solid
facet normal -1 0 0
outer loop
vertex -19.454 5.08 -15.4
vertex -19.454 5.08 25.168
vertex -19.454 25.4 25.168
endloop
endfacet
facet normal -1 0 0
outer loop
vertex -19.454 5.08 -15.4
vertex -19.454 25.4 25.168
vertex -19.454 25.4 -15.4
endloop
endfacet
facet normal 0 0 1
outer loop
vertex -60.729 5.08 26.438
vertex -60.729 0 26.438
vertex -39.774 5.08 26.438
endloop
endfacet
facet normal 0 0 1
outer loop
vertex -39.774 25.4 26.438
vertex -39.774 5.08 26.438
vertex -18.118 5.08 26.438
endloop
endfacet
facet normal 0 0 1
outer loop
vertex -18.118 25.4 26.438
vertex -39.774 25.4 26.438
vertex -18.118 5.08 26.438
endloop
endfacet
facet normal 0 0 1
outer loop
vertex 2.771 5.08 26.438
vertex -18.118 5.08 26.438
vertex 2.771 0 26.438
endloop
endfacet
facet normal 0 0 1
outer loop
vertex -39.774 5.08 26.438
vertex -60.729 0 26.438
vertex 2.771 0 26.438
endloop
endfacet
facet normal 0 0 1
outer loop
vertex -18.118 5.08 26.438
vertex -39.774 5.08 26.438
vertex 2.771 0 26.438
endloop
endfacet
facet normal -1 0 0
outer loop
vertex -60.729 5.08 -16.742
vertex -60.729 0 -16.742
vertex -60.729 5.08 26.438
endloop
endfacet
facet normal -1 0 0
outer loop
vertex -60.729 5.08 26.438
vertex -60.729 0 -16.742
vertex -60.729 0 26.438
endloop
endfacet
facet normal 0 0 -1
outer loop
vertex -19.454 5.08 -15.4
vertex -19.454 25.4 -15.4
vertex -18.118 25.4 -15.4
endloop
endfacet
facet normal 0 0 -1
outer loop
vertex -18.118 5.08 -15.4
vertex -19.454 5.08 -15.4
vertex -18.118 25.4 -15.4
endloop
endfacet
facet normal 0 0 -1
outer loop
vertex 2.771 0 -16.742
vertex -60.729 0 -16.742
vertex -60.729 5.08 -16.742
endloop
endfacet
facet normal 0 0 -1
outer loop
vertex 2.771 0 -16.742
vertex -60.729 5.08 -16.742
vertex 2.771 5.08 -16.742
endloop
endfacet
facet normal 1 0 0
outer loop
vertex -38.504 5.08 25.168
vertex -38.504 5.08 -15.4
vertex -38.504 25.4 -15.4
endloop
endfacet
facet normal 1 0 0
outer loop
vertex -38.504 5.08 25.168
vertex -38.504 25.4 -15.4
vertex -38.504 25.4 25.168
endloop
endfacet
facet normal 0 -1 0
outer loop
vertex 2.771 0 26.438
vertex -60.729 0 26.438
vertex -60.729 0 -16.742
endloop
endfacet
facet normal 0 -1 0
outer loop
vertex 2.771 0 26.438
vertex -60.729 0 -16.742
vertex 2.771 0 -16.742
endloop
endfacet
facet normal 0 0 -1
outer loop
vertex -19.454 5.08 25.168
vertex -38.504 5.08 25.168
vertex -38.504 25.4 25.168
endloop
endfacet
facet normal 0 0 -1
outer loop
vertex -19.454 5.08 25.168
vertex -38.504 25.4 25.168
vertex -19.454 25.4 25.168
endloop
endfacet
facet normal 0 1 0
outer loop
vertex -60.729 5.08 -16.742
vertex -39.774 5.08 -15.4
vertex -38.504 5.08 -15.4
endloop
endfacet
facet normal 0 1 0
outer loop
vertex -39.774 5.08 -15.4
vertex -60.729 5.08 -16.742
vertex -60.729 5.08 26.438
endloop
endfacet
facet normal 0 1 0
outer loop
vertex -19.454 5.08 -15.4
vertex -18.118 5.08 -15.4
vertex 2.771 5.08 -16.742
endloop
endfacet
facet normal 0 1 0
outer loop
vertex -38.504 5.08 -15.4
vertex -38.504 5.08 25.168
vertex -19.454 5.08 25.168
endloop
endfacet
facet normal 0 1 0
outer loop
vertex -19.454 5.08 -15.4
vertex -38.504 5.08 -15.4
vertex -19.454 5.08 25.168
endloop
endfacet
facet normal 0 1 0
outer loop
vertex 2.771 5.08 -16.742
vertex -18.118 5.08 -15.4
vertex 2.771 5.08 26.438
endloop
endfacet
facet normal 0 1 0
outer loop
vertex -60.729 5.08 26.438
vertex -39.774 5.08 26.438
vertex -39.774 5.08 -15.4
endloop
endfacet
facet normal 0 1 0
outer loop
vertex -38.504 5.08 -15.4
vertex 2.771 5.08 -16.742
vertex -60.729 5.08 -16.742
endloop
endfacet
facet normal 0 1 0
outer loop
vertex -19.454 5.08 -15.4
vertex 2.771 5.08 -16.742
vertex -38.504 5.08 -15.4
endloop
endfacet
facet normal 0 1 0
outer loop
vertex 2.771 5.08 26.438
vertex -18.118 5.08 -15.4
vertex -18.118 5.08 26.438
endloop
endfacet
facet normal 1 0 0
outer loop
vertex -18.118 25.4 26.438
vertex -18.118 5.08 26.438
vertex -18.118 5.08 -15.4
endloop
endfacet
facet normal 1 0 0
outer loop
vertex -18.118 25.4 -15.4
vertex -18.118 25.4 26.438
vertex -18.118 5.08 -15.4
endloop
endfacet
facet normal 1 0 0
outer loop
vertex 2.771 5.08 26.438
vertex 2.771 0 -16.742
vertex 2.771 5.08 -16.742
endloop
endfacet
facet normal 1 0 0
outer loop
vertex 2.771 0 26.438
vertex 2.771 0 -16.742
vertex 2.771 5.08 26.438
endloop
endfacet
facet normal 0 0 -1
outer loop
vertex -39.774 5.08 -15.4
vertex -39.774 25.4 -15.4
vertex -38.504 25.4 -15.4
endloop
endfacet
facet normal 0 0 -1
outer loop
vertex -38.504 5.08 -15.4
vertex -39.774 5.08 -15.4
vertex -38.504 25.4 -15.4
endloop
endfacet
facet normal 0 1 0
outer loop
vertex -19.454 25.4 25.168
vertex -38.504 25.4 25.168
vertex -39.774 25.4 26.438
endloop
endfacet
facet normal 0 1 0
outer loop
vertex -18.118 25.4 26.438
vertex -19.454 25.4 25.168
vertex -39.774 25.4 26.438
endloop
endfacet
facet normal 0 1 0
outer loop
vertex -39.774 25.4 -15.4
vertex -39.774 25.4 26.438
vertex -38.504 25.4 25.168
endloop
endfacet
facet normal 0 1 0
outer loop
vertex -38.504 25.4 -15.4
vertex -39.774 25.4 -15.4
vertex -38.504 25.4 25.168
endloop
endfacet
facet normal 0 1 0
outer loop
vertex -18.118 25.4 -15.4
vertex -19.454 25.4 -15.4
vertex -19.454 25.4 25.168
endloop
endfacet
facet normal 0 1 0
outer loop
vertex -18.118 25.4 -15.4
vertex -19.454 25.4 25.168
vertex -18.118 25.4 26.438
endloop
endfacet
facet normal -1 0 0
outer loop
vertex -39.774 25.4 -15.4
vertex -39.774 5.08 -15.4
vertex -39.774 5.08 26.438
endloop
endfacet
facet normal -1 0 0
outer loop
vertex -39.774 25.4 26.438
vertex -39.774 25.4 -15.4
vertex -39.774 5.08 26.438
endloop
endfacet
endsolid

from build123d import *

# Parameters (mm, degrees)
SKETCH1_W           = 63.5
SKETCH1_H           = 21.59
BOSS_EXTRUDE1_DEPTH = 5.08
SKETCH2_W           = 19.05
SKETCH2_H           = 20.32
BOSS_EXTRUDE2_DEPTH = 1.27
SKETCH3_W           = 1.27
SKETCH3_H           = 21.59
BOSS_EXTRUDE3_DEPTH = 20.32
SKETCH4_W           = 1.336000662
SKETCH4_H           = 43.13668157
BOSS_EXTRUDE4_DEPTH = 20.32
SKETCH5_W           = 10.16
SKETCH5_H           = 20.215193183
CUT_EXTRUDE2_DEPTH  = 1.27
SKETCH6_W           = 21.656000662
SKETCH6_H           = 1.342156596
CUT_EXTRUDE3_DEPTH  = 20.32


with BuildPart() as part:
    # Sketch1 → Boss-Extrude1 (new body)
    with BuildSketch(Plane(origin=(0, 0, 0), x_dir=(1, 0, 0), z_dir=(0, 1, 0))):
        with Locations((-28.979219315, -15.643333637)):
            Rectangle(SKETCH1_W, SKETCH1_H)
    boss_extrude1 = extrude(amount=BOSS_EXTRUDE1_DEPTH)

    # Sketch2 → Boss-Extrude2 (add)
    with BuildSketch(Plane.XY.offset(26.438333637)):
        with Locations((-28.979219315, 15.24)):
            Rectangle(SKETCH2_W, SKETCH2_H)
    boss_extrude2 = extrude(amount=-BOSS_EXTRUDE2_DEPTH)

    # Sketch3 → Boss-Extrude3 (add)
    with BuildSketch(Plane(origin=(0, 5.08, 0), x_dir=(1, 0, 0), z_dir=(0, 1, 0))):
        with Locations((-39.139219315, -15.643333637)):
            Rectangle(SKETCH3_W, SKETCH3_H)
    boss_extrude3 = extrude(amount=BOSS_EXTRUDE3_DEPTH)

    # Mirror2: Boss-Extrude1, Boss-Extrude2, Boss-Extrude3 across plane
    add(boss_extrude1.mirror(Plane(origin=(-60.729219315, 5.08, 4.848333637), x_dir=(1, 0, 0), z_dir=(0, 0, 1))))
    add(boss_extrude2.mirror(Plane(origin=(-60.729219315, 5.08, 4.848333637), x_dir=(1, 0, 0), z_dir=(0, 0, 1))))
    add(boss_extrude3.mirror(Plane(origin=(-60.729219315, 5.08, 4.848333637), x_dir=(1, 0, 0), z_dir=(0, 0, 1))))

    # Sketch4 → Boss-Extrude4 (add)
    with BuildSketch(Plane(origin=(0, 5.08, 0), x_dir=(1, 0, 0), z_dir=(0, 1, 0))):
        with Locations((-18.786218984, -4.869992852)):
            Rectangle(SKETCH4_W, SKETCH4_H)
    extrude(amount=BOSS_EXTRUDE4_DEPTH)

    # Sketch5 → Cut-Extrude2 (cut)
    with BuildSketch(Plane(origin=(0, 0, -16.741666363), x_dir=(-1, 0, 0), z_dir=(0, 0, -1))):
        with Locations((29.613387645, 15.279515477)):
            Rectangle(SKETCH5_W, SKETCH5_H)
    extrude(amount=-CUT_EXTRUDE2_DEPTH, mode=Mode.SUBTRACT)

    # Sketch6 → Cut-Extrude3 (cut)
    with BuildSketch(Plane(origin=(0, 25.4, 0), x_dir=(1, 0, 0), z_dir=(0, 1, 0))):
        with Locations((-28.946218984, 16.070588065)):
            Rectangle(SKETCH6_W, SKETCH6_H)
    extrude(amount=-CUT_EXTRUDE3_DEPTH, mode=Mode.SUBTRACT)


solid = part.part
